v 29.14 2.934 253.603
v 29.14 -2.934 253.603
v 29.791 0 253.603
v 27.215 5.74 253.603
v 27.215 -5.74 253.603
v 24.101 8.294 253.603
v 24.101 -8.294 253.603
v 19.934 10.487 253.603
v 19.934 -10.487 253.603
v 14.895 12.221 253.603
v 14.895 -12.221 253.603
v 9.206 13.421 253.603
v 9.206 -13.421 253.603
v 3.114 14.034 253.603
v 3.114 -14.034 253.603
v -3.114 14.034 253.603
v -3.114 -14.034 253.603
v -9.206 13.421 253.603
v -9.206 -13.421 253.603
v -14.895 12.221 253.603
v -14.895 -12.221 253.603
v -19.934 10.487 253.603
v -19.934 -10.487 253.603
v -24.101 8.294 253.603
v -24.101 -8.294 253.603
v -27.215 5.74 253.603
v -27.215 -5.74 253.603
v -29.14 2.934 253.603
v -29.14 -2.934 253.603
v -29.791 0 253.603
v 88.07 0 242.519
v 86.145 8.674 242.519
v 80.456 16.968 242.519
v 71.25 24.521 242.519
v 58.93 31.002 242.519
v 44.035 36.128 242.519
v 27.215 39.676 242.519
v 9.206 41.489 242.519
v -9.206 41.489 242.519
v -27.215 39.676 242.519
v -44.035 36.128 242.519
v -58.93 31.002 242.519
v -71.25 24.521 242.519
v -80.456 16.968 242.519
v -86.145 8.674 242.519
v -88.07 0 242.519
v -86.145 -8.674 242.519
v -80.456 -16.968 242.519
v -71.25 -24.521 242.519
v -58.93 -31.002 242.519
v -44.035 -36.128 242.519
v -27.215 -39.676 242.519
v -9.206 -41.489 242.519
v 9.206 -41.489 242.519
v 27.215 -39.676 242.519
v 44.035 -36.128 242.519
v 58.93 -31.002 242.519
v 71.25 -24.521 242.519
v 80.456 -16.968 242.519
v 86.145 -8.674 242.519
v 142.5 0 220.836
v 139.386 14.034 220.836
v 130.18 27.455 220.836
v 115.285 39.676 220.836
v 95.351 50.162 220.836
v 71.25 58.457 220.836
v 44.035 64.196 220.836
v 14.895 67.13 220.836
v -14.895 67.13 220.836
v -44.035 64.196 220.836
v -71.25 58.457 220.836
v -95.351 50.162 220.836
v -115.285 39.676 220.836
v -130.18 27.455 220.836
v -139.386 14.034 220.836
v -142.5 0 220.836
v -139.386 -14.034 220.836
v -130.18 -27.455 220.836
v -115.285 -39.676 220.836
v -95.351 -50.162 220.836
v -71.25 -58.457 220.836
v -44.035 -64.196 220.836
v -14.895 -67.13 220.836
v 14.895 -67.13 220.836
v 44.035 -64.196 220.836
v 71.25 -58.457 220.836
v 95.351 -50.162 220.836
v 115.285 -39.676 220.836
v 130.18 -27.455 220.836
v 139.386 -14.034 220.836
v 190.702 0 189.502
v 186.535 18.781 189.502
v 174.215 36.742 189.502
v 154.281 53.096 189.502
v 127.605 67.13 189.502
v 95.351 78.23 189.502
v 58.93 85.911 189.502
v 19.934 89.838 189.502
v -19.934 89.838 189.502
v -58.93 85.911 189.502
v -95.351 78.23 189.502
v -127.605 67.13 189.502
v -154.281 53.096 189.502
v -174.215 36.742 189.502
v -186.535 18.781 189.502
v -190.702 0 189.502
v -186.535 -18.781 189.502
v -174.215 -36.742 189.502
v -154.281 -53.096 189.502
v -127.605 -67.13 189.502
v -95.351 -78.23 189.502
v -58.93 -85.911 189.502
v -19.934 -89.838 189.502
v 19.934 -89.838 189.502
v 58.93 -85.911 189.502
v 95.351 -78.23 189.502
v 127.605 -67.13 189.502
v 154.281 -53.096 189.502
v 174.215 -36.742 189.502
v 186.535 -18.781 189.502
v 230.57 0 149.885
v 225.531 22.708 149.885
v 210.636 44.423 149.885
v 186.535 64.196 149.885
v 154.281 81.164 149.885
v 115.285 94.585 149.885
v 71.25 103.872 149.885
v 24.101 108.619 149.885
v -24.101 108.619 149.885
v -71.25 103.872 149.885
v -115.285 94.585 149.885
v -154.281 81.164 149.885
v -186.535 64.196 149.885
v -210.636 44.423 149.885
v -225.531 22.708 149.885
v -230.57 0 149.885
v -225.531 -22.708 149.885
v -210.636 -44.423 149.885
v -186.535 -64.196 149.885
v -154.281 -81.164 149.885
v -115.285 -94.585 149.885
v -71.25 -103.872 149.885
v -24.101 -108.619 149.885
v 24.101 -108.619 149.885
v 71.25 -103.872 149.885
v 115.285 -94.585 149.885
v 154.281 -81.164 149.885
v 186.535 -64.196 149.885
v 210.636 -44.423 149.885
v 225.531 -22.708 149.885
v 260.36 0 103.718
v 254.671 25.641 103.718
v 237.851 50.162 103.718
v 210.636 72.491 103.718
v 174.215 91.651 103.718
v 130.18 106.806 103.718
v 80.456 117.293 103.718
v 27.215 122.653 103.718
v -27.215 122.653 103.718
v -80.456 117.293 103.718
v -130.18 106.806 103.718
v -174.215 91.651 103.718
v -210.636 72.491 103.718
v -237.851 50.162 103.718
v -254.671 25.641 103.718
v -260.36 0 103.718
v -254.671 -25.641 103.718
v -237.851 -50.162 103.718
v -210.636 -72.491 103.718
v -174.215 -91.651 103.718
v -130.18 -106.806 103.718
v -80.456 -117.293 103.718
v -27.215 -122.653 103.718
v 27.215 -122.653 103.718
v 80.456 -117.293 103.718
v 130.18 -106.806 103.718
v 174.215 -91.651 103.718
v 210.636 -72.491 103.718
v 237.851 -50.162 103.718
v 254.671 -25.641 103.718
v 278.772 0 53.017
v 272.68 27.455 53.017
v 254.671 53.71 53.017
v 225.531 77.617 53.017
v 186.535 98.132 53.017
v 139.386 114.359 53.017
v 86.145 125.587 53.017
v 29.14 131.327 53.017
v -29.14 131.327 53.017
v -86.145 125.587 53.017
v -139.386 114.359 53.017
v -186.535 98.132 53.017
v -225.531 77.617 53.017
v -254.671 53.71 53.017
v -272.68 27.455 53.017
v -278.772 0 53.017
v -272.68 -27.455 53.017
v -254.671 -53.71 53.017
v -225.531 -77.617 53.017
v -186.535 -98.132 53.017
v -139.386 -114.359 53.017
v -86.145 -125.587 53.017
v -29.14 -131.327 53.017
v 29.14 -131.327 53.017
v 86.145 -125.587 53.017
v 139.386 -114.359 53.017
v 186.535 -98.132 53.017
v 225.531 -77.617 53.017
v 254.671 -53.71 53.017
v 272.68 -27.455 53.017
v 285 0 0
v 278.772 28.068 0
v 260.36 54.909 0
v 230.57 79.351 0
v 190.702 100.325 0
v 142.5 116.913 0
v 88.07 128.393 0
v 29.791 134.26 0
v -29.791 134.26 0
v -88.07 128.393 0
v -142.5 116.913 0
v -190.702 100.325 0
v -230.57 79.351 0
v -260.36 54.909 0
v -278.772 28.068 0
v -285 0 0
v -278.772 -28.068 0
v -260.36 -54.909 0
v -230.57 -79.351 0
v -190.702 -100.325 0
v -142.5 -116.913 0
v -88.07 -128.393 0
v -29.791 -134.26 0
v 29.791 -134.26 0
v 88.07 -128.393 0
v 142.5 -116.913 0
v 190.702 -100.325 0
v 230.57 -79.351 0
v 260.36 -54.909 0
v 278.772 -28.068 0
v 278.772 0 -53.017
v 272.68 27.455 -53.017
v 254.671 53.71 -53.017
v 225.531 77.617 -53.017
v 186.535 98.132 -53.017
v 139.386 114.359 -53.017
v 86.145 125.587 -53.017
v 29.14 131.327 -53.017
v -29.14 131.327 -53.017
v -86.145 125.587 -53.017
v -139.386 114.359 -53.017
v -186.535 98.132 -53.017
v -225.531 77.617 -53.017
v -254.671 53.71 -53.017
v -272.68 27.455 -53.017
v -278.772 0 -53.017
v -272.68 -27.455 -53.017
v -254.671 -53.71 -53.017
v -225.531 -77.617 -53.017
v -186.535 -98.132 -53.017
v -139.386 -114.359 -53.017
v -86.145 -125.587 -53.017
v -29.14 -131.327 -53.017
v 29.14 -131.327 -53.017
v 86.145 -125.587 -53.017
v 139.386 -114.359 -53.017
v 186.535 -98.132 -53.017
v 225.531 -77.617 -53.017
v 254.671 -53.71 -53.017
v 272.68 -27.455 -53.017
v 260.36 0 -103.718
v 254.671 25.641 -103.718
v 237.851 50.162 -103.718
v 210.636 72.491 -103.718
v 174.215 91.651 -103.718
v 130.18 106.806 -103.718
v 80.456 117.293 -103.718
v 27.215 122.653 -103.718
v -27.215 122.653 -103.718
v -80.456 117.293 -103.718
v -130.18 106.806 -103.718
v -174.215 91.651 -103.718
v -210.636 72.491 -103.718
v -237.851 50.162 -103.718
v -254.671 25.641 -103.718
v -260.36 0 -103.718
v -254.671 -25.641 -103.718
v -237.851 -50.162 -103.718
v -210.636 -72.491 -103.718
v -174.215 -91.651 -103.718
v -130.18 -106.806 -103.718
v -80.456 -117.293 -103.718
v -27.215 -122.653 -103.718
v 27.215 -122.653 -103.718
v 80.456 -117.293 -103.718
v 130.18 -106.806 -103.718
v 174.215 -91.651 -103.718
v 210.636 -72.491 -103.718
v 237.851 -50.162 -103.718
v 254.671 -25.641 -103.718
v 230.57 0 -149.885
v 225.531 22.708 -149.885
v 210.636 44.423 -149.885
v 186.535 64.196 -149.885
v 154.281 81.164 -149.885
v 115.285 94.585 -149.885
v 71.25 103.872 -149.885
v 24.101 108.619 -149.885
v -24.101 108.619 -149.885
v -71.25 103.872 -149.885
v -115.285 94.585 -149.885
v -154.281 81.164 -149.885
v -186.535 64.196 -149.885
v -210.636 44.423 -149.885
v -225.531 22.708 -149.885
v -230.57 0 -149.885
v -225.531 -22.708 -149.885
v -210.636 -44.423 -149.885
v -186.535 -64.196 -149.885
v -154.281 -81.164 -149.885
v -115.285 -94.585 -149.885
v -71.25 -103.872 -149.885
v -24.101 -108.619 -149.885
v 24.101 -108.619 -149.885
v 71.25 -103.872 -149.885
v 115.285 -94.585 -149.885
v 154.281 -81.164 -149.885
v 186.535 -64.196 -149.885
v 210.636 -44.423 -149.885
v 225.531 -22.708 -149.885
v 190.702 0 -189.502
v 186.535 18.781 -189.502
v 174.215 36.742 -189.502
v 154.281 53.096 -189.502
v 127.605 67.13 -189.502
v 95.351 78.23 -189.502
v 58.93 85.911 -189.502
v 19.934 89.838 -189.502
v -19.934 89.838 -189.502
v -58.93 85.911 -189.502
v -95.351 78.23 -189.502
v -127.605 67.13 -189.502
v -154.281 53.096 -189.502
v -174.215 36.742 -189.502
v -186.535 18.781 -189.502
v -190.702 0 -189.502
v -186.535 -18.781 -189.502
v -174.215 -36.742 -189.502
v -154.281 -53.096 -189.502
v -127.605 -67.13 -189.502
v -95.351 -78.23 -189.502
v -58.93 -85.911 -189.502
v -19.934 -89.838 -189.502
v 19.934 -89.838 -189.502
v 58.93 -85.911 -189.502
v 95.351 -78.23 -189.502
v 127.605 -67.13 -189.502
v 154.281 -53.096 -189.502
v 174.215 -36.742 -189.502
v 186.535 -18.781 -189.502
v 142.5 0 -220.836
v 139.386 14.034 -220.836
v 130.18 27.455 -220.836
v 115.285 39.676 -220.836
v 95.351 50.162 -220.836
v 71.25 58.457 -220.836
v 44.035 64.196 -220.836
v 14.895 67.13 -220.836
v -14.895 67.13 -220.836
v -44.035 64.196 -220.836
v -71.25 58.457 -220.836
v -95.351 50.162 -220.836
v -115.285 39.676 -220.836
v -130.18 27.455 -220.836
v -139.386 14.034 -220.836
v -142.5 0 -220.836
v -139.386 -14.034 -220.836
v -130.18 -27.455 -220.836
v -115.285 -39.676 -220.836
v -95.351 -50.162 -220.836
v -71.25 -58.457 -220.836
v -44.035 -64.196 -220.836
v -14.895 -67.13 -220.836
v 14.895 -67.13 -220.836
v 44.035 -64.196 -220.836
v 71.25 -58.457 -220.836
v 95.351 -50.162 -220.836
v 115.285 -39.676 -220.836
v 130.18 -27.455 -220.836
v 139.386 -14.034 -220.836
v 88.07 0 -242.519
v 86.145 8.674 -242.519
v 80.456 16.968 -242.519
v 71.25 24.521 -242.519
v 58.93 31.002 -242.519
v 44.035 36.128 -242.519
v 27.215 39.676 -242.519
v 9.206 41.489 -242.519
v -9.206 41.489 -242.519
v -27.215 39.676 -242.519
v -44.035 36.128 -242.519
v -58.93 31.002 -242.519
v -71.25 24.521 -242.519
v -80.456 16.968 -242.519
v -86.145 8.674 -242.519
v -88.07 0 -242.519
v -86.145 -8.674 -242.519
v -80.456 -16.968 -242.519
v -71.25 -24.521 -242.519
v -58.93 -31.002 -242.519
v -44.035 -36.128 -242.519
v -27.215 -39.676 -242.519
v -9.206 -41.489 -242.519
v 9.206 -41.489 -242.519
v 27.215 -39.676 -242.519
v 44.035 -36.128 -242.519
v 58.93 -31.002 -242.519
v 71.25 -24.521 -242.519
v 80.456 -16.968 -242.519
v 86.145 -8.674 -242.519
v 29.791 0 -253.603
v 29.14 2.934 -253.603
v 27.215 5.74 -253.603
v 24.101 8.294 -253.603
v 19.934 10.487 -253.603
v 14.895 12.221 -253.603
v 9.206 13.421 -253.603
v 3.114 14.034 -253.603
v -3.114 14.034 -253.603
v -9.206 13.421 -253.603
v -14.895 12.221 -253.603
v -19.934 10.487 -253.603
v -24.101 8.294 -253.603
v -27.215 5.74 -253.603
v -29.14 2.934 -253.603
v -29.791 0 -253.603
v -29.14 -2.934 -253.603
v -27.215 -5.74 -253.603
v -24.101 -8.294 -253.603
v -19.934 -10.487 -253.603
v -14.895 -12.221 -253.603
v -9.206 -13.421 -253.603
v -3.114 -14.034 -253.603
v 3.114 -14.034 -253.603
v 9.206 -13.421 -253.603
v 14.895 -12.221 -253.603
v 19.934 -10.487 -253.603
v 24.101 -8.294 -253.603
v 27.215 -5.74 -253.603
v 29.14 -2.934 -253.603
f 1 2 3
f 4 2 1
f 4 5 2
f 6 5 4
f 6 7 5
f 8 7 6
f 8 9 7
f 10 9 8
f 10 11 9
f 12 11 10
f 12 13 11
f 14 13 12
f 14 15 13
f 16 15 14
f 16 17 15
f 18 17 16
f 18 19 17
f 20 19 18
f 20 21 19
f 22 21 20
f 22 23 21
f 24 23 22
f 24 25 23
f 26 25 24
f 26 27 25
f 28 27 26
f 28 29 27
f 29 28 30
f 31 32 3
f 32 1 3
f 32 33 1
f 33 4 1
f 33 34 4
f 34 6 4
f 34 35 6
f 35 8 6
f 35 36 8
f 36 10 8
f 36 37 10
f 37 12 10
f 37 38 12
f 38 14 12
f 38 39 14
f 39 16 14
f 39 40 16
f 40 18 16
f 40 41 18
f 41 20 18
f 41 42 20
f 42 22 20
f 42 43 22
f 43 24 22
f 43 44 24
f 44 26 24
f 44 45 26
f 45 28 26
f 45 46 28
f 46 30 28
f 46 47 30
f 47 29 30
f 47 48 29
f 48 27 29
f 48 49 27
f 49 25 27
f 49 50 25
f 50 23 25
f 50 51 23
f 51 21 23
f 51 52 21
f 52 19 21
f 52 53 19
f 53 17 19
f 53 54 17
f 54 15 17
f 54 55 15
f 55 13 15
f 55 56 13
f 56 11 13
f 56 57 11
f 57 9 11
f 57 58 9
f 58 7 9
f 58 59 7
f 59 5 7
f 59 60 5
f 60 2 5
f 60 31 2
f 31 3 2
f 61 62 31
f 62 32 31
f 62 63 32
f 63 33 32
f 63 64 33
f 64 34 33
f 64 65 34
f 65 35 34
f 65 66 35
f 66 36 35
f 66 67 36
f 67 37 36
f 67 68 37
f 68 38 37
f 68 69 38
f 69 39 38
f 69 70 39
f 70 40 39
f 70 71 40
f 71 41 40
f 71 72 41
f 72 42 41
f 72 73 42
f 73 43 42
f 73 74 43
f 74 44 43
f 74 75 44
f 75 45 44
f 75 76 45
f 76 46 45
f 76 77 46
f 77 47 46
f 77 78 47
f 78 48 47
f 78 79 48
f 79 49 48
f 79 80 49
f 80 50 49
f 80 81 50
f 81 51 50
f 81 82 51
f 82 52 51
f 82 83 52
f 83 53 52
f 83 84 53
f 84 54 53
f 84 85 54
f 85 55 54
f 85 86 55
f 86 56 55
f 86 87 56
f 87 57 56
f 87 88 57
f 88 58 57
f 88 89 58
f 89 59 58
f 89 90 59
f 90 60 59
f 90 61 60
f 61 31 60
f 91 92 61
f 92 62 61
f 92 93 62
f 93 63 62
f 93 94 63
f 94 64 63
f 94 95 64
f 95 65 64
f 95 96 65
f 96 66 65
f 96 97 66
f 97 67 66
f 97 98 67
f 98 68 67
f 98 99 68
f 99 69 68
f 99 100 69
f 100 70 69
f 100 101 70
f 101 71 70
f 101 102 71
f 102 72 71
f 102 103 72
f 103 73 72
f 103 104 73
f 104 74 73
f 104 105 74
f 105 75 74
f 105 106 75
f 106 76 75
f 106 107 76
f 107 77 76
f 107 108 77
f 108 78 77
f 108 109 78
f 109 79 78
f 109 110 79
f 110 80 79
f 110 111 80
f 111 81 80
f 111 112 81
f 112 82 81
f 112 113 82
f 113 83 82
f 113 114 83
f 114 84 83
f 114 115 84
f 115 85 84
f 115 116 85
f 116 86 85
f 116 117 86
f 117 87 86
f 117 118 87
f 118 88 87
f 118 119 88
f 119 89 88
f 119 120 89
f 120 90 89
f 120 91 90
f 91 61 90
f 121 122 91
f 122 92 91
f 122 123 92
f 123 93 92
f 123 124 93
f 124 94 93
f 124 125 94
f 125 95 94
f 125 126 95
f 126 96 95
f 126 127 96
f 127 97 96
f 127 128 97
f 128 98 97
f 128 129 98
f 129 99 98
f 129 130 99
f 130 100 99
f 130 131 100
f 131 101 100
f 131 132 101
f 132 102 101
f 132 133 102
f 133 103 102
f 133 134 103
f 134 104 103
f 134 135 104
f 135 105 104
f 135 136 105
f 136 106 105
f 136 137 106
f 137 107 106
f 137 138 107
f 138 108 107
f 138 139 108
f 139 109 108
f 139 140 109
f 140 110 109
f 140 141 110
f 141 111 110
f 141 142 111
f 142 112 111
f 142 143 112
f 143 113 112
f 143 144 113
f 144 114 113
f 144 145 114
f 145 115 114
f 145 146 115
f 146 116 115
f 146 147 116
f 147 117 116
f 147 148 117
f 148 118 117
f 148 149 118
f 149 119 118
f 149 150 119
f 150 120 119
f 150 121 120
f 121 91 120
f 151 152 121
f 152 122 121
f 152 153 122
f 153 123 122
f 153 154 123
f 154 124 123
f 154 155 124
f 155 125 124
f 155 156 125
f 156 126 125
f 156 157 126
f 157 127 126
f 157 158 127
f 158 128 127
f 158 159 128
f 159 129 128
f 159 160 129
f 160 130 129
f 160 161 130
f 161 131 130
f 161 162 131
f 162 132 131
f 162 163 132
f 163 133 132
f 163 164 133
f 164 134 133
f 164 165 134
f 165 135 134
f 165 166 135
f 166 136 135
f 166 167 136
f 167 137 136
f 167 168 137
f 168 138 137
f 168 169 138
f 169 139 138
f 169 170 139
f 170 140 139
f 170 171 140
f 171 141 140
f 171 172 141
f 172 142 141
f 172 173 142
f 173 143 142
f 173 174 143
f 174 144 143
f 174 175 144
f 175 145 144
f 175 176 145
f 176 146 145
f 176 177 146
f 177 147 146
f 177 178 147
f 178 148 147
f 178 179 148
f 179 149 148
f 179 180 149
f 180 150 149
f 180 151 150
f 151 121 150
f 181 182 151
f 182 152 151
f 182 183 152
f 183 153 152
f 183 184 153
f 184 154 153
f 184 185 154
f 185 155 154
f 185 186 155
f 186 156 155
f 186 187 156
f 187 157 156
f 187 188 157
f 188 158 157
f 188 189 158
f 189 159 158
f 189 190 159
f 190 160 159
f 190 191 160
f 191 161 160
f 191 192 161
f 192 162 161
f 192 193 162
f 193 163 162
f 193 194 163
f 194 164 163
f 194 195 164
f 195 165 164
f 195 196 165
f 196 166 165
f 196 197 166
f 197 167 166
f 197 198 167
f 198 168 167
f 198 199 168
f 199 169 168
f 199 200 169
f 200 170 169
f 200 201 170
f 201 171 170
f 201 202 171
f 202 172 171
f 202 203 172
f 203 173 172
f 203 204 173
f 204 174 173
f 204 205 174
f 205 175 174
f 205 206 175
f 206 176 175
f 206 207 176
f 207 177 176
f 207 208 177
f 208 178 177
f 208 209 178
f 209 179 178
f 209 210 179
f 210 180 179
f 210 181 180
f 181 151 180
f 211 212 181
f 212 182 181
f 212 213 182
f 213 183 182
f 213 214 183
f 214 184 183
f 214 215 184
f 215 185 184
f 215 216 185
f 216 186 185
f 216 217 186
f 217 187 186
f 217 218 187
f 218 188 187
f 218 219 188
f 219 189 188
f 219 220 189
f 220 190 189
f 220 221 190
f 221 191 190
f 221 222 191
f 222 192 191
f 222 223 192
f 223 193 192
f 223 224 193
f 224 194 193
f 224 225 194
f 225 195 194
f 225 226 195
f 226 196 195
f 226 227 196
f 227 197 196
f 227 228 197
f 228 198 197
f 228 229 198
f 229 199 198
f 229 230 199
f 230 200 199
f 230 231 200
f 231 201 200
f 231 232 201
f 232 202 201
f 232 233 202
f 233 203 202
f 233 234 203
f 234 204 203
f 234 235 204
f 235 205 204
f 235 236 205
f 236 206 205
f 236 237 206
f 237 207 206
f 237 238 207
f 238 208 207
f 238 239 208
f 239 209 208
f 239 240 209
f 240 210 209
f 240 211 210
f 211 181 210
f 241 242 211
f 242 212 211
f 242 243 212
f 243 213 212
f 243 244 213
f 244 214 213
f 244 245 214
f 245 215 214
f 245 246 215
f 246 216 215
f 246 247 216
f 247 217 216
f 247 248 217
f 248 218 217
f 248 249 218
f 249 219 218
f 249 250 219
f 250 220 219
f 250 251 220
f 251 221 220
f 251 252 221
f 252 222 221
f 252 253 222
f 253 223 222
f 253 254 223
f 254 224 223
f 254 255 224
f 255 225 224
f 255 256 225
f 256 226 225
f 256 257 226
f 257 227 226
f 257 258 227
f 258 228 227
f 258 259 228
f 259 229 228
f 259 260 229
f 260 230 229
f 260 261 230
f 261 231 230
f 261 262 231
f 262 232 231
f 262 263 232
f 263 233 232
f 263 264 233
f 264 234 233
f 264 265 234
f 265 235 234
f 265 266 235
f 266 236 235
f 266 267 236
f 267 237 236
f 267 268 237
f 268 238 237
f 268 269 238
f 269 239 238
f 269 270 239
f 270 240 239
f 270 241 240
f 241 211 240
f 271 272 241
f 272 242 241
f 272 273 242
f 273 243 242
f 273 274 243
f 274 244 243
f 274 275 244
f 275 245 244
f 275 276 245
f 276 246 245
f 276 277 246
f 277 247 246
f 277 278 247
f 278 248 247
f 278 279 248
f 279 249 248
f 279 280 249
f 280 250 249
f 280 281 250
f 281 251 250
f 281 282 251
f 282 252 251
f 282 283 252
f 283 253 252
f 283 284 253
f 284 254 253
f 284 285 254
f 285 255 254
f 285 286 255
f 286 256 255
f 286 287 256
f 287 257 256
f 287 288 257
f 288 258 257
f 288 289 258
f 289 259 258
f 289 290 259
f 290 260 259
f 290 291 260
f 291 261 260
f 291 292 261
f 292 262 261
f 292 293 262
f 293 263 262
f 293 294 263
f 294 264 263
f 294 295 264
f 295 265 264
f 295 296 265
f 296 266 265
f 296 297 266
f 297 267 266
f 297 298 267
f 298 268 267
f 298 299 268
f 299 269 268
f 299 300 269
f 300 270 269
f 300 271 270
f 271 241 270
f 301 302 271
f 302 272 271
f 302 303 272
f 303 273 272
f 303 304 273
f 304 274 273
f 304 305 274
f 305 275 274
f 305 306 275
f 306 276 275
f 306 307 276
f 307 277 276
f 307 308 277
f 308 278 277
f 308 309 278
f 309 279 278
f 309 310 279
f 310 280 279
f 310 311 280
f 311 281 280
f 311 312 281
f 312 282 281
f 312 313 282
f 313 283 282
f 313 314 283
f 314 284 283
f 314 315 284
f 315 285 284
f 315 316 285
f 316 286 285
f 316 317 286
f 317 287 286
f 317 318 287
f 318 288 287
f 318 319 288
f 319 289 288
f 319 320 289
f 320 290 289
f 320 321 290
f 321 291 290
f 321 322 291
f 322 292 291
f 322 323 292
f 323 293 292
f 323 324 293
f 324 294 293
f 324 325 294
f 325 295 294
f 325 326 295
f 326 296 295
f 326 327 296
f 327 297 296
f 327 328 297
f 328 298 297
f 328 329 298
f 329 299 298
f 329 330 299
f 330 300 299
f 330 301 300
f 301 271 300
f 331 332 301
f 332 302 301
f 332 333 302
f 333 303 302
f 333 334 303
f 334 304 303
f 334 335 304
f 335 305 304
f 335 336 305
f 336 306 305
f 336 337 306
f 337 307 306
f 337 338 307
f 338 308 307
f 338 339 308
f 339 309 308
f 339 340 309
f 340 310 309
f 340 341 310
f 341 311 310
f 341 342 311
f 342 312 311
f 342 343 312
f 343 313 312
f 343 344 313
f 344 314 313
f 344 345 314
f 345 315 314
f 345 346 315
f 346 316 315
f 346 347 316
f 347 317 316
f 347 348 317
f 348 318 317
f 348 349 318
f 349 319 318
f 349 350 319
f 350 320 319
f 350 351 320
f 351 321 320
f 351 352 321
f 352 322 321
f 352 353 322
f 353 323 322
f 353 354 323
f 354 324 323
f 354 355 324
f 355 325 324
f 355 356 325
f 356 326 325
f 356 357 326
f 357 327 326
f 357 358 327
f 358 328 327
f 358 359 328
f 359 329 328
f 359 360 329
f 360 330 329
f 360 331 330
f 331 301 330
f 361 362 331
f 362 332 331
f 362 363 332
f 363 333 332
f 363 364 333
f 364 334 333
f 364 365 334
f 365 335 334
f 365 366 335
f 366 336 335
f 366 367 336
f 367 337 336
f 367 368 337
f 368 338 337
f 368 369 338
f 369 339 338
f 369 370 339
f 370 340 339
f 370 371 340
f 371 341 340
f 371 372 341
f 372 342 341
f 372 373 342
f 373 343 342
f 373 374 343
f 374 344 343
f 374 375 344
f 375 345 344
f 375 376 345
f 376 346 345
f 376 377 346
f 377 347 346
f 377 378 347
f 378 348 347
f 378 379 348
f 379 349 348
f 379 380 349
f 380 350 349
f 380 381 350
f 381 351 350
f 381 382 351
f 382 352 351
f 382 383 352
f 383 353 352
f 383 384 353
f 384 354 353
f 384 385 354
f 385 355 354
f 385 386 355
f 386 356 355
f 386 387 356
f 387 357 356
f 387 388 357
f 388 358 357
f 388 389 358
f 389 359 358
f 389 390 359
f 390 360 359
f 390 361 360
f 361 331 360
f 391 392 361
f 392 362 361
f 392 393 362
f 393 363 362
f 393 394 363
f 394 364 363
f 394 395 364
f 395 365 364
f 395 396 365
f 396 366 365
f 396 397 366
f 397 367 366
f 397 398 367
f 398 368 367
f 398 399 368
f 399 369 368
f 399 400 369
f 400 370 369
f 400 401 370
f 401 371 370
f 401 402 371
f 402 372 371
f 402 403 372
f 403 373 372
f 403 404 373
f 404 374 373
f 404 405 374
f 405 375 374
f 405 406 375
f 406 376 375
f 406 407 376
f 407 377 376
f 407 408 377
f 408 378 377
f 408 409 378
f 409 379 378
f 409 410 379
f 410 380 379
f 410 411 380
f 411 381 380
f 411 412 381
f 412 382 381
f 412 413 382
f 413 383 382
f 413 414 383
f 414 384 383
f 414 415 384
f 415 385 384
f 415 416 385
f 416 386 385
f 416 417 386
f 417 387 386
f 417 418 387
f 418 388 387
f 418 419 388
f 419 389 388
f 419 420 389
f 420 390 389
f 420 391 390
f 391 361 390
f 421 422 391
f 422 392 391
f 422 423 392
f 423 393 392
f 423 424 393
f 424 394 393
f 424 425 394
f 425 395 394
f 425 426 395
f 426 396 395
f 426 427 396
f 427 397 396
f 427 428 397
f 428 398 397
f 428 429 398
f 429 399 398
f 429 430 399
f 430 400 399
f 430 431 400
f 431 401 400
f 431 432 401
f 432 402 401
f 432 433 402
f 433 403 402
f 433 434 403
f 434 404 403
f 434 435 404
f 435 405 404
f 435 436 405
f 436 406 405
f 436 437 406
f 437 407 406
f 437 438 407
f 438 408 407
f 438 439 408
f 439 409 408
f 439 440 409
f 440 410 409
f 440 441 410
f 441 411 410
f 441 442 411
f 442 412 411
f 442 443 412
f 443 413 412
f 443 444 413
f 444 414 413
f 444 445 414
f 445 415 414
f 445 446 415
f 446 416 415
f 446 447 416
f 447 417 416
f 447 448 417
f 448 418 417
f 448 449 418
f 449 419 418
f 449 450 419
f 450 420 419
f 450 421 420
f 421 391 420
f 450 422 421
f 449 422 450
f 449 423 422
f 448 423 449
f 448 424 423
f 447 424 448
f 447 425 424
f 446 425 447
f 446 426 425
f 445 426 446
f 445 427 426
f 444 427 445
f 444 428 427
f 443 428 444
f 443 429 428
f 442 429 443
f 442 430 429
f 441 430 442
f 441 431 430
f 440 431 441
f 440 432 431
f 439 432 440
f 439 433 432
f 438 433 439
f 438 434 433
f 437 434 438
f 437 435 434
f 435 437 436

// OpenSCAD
// Generated by SolidPython 1.0.1 on 2020-07-29 00:46:54


scale(v = [19, 9, 17]) {
	sphere(r = 15);
}
/***********************************************
*********      SolidPython code:      **********
************************************************
 
# import packages: SolidPython
from solid import *
from solid.utils import *
from itertools import chain, combinations, permutations


class Resize:

    def __init__(self, scad_file):
        self.scad_file = scad_file
        #self.scad_file = import_scad(scad_file)
        # cone/cylinder param:
        self.r1 = 0
        self.r2 = 0
        self.h = 0
        # rectangular prism param:
        self.w = 0
        self.l = 0
        # ellipse param:
        self.r = 0

    # import OpenScad code (file name corresponds to shape)


    # classify shape + parameters
    def assign(self, param1, param2, param3):
        if self.scad_file == 'cone.scad':
            self.r1 = param1
            self.r2 = param2
            self.h = param3
        elif self.scad_file == 'cylinder.scad':
            self.r1 = param1
            self.r2 = param2
            self.h = param3
        elif self.scad_file == 'rectangularPrism.scad':
            self.h = param1
            self.l = param2
            self.w = param3
        else:
            self.r = param1
            self.h = param2

    # resize parameters
    def iterate(self):
        x = range(3, 20, 2)
        i = 1
        if self.scad_file == 'cone.scad':
            tempList = list(permutations(x, 2))
            for temp in tempList:
                param1 = temp[0]
                param2 = temp[1]
                filepath = 'produced_scad_files/' + 'cone' + str(param1) + '_' + str(param2) + '_' + '.scad'
                scad_render_to_file(cylinder(h=param1, r1=param2, r2=0), filepath)

        elif self.scad_file == 'cylinder.scad':
            tempList = list(permutations(x, 3))
            for temp in tempList:
                param1 = temp[0]
                param2 = temp[1]
                filepath = 'produced_scad_files/' + 'cylinder' + str(param1) + '_' + str(param2) + '_' + '.scad'
                scad_render_to_file(cylinder(h=param1, r1=param2, r2=param2), filepath)

        elif self.scad_file == 'rectangularPrism.scad':
            tempList = list(permutations(x, 3))
            for temp in tempList:
                param1 = temp[0]
                param2 = temp[1]
                param3 = temp[2]
                filepath = 'produced_scad_files/' + 'rectangularPrism' + str(param1) + '_' + str(param2) + '_' + str(
                    param3) + '.scad'
                scad_render_to_file(cube(size=(param1, param2, param3)), filepath)

        elif self.scad_file == 'ellipse.scad':
            tempList = list(permutations(x, 4))
            for temp in tempList:
                param1 = temp[0]
                param2 = temp[1]
                param3 = temp[2]
                param4 = temp[3]
                filepath = 'produced_scad_files/' + 'ellipse' + str(param1) + '_' + str(param2) + '_' + str(param3) + '_' + str(param4) + '.scad'
                scad_render_to_file(scale([param1, param2, param3])(sphere(r=param4)), filepath)

    def render_to_scadfile(self):
        scad_render_to_file(scad, 'example.scad') 
 
************************************************/
